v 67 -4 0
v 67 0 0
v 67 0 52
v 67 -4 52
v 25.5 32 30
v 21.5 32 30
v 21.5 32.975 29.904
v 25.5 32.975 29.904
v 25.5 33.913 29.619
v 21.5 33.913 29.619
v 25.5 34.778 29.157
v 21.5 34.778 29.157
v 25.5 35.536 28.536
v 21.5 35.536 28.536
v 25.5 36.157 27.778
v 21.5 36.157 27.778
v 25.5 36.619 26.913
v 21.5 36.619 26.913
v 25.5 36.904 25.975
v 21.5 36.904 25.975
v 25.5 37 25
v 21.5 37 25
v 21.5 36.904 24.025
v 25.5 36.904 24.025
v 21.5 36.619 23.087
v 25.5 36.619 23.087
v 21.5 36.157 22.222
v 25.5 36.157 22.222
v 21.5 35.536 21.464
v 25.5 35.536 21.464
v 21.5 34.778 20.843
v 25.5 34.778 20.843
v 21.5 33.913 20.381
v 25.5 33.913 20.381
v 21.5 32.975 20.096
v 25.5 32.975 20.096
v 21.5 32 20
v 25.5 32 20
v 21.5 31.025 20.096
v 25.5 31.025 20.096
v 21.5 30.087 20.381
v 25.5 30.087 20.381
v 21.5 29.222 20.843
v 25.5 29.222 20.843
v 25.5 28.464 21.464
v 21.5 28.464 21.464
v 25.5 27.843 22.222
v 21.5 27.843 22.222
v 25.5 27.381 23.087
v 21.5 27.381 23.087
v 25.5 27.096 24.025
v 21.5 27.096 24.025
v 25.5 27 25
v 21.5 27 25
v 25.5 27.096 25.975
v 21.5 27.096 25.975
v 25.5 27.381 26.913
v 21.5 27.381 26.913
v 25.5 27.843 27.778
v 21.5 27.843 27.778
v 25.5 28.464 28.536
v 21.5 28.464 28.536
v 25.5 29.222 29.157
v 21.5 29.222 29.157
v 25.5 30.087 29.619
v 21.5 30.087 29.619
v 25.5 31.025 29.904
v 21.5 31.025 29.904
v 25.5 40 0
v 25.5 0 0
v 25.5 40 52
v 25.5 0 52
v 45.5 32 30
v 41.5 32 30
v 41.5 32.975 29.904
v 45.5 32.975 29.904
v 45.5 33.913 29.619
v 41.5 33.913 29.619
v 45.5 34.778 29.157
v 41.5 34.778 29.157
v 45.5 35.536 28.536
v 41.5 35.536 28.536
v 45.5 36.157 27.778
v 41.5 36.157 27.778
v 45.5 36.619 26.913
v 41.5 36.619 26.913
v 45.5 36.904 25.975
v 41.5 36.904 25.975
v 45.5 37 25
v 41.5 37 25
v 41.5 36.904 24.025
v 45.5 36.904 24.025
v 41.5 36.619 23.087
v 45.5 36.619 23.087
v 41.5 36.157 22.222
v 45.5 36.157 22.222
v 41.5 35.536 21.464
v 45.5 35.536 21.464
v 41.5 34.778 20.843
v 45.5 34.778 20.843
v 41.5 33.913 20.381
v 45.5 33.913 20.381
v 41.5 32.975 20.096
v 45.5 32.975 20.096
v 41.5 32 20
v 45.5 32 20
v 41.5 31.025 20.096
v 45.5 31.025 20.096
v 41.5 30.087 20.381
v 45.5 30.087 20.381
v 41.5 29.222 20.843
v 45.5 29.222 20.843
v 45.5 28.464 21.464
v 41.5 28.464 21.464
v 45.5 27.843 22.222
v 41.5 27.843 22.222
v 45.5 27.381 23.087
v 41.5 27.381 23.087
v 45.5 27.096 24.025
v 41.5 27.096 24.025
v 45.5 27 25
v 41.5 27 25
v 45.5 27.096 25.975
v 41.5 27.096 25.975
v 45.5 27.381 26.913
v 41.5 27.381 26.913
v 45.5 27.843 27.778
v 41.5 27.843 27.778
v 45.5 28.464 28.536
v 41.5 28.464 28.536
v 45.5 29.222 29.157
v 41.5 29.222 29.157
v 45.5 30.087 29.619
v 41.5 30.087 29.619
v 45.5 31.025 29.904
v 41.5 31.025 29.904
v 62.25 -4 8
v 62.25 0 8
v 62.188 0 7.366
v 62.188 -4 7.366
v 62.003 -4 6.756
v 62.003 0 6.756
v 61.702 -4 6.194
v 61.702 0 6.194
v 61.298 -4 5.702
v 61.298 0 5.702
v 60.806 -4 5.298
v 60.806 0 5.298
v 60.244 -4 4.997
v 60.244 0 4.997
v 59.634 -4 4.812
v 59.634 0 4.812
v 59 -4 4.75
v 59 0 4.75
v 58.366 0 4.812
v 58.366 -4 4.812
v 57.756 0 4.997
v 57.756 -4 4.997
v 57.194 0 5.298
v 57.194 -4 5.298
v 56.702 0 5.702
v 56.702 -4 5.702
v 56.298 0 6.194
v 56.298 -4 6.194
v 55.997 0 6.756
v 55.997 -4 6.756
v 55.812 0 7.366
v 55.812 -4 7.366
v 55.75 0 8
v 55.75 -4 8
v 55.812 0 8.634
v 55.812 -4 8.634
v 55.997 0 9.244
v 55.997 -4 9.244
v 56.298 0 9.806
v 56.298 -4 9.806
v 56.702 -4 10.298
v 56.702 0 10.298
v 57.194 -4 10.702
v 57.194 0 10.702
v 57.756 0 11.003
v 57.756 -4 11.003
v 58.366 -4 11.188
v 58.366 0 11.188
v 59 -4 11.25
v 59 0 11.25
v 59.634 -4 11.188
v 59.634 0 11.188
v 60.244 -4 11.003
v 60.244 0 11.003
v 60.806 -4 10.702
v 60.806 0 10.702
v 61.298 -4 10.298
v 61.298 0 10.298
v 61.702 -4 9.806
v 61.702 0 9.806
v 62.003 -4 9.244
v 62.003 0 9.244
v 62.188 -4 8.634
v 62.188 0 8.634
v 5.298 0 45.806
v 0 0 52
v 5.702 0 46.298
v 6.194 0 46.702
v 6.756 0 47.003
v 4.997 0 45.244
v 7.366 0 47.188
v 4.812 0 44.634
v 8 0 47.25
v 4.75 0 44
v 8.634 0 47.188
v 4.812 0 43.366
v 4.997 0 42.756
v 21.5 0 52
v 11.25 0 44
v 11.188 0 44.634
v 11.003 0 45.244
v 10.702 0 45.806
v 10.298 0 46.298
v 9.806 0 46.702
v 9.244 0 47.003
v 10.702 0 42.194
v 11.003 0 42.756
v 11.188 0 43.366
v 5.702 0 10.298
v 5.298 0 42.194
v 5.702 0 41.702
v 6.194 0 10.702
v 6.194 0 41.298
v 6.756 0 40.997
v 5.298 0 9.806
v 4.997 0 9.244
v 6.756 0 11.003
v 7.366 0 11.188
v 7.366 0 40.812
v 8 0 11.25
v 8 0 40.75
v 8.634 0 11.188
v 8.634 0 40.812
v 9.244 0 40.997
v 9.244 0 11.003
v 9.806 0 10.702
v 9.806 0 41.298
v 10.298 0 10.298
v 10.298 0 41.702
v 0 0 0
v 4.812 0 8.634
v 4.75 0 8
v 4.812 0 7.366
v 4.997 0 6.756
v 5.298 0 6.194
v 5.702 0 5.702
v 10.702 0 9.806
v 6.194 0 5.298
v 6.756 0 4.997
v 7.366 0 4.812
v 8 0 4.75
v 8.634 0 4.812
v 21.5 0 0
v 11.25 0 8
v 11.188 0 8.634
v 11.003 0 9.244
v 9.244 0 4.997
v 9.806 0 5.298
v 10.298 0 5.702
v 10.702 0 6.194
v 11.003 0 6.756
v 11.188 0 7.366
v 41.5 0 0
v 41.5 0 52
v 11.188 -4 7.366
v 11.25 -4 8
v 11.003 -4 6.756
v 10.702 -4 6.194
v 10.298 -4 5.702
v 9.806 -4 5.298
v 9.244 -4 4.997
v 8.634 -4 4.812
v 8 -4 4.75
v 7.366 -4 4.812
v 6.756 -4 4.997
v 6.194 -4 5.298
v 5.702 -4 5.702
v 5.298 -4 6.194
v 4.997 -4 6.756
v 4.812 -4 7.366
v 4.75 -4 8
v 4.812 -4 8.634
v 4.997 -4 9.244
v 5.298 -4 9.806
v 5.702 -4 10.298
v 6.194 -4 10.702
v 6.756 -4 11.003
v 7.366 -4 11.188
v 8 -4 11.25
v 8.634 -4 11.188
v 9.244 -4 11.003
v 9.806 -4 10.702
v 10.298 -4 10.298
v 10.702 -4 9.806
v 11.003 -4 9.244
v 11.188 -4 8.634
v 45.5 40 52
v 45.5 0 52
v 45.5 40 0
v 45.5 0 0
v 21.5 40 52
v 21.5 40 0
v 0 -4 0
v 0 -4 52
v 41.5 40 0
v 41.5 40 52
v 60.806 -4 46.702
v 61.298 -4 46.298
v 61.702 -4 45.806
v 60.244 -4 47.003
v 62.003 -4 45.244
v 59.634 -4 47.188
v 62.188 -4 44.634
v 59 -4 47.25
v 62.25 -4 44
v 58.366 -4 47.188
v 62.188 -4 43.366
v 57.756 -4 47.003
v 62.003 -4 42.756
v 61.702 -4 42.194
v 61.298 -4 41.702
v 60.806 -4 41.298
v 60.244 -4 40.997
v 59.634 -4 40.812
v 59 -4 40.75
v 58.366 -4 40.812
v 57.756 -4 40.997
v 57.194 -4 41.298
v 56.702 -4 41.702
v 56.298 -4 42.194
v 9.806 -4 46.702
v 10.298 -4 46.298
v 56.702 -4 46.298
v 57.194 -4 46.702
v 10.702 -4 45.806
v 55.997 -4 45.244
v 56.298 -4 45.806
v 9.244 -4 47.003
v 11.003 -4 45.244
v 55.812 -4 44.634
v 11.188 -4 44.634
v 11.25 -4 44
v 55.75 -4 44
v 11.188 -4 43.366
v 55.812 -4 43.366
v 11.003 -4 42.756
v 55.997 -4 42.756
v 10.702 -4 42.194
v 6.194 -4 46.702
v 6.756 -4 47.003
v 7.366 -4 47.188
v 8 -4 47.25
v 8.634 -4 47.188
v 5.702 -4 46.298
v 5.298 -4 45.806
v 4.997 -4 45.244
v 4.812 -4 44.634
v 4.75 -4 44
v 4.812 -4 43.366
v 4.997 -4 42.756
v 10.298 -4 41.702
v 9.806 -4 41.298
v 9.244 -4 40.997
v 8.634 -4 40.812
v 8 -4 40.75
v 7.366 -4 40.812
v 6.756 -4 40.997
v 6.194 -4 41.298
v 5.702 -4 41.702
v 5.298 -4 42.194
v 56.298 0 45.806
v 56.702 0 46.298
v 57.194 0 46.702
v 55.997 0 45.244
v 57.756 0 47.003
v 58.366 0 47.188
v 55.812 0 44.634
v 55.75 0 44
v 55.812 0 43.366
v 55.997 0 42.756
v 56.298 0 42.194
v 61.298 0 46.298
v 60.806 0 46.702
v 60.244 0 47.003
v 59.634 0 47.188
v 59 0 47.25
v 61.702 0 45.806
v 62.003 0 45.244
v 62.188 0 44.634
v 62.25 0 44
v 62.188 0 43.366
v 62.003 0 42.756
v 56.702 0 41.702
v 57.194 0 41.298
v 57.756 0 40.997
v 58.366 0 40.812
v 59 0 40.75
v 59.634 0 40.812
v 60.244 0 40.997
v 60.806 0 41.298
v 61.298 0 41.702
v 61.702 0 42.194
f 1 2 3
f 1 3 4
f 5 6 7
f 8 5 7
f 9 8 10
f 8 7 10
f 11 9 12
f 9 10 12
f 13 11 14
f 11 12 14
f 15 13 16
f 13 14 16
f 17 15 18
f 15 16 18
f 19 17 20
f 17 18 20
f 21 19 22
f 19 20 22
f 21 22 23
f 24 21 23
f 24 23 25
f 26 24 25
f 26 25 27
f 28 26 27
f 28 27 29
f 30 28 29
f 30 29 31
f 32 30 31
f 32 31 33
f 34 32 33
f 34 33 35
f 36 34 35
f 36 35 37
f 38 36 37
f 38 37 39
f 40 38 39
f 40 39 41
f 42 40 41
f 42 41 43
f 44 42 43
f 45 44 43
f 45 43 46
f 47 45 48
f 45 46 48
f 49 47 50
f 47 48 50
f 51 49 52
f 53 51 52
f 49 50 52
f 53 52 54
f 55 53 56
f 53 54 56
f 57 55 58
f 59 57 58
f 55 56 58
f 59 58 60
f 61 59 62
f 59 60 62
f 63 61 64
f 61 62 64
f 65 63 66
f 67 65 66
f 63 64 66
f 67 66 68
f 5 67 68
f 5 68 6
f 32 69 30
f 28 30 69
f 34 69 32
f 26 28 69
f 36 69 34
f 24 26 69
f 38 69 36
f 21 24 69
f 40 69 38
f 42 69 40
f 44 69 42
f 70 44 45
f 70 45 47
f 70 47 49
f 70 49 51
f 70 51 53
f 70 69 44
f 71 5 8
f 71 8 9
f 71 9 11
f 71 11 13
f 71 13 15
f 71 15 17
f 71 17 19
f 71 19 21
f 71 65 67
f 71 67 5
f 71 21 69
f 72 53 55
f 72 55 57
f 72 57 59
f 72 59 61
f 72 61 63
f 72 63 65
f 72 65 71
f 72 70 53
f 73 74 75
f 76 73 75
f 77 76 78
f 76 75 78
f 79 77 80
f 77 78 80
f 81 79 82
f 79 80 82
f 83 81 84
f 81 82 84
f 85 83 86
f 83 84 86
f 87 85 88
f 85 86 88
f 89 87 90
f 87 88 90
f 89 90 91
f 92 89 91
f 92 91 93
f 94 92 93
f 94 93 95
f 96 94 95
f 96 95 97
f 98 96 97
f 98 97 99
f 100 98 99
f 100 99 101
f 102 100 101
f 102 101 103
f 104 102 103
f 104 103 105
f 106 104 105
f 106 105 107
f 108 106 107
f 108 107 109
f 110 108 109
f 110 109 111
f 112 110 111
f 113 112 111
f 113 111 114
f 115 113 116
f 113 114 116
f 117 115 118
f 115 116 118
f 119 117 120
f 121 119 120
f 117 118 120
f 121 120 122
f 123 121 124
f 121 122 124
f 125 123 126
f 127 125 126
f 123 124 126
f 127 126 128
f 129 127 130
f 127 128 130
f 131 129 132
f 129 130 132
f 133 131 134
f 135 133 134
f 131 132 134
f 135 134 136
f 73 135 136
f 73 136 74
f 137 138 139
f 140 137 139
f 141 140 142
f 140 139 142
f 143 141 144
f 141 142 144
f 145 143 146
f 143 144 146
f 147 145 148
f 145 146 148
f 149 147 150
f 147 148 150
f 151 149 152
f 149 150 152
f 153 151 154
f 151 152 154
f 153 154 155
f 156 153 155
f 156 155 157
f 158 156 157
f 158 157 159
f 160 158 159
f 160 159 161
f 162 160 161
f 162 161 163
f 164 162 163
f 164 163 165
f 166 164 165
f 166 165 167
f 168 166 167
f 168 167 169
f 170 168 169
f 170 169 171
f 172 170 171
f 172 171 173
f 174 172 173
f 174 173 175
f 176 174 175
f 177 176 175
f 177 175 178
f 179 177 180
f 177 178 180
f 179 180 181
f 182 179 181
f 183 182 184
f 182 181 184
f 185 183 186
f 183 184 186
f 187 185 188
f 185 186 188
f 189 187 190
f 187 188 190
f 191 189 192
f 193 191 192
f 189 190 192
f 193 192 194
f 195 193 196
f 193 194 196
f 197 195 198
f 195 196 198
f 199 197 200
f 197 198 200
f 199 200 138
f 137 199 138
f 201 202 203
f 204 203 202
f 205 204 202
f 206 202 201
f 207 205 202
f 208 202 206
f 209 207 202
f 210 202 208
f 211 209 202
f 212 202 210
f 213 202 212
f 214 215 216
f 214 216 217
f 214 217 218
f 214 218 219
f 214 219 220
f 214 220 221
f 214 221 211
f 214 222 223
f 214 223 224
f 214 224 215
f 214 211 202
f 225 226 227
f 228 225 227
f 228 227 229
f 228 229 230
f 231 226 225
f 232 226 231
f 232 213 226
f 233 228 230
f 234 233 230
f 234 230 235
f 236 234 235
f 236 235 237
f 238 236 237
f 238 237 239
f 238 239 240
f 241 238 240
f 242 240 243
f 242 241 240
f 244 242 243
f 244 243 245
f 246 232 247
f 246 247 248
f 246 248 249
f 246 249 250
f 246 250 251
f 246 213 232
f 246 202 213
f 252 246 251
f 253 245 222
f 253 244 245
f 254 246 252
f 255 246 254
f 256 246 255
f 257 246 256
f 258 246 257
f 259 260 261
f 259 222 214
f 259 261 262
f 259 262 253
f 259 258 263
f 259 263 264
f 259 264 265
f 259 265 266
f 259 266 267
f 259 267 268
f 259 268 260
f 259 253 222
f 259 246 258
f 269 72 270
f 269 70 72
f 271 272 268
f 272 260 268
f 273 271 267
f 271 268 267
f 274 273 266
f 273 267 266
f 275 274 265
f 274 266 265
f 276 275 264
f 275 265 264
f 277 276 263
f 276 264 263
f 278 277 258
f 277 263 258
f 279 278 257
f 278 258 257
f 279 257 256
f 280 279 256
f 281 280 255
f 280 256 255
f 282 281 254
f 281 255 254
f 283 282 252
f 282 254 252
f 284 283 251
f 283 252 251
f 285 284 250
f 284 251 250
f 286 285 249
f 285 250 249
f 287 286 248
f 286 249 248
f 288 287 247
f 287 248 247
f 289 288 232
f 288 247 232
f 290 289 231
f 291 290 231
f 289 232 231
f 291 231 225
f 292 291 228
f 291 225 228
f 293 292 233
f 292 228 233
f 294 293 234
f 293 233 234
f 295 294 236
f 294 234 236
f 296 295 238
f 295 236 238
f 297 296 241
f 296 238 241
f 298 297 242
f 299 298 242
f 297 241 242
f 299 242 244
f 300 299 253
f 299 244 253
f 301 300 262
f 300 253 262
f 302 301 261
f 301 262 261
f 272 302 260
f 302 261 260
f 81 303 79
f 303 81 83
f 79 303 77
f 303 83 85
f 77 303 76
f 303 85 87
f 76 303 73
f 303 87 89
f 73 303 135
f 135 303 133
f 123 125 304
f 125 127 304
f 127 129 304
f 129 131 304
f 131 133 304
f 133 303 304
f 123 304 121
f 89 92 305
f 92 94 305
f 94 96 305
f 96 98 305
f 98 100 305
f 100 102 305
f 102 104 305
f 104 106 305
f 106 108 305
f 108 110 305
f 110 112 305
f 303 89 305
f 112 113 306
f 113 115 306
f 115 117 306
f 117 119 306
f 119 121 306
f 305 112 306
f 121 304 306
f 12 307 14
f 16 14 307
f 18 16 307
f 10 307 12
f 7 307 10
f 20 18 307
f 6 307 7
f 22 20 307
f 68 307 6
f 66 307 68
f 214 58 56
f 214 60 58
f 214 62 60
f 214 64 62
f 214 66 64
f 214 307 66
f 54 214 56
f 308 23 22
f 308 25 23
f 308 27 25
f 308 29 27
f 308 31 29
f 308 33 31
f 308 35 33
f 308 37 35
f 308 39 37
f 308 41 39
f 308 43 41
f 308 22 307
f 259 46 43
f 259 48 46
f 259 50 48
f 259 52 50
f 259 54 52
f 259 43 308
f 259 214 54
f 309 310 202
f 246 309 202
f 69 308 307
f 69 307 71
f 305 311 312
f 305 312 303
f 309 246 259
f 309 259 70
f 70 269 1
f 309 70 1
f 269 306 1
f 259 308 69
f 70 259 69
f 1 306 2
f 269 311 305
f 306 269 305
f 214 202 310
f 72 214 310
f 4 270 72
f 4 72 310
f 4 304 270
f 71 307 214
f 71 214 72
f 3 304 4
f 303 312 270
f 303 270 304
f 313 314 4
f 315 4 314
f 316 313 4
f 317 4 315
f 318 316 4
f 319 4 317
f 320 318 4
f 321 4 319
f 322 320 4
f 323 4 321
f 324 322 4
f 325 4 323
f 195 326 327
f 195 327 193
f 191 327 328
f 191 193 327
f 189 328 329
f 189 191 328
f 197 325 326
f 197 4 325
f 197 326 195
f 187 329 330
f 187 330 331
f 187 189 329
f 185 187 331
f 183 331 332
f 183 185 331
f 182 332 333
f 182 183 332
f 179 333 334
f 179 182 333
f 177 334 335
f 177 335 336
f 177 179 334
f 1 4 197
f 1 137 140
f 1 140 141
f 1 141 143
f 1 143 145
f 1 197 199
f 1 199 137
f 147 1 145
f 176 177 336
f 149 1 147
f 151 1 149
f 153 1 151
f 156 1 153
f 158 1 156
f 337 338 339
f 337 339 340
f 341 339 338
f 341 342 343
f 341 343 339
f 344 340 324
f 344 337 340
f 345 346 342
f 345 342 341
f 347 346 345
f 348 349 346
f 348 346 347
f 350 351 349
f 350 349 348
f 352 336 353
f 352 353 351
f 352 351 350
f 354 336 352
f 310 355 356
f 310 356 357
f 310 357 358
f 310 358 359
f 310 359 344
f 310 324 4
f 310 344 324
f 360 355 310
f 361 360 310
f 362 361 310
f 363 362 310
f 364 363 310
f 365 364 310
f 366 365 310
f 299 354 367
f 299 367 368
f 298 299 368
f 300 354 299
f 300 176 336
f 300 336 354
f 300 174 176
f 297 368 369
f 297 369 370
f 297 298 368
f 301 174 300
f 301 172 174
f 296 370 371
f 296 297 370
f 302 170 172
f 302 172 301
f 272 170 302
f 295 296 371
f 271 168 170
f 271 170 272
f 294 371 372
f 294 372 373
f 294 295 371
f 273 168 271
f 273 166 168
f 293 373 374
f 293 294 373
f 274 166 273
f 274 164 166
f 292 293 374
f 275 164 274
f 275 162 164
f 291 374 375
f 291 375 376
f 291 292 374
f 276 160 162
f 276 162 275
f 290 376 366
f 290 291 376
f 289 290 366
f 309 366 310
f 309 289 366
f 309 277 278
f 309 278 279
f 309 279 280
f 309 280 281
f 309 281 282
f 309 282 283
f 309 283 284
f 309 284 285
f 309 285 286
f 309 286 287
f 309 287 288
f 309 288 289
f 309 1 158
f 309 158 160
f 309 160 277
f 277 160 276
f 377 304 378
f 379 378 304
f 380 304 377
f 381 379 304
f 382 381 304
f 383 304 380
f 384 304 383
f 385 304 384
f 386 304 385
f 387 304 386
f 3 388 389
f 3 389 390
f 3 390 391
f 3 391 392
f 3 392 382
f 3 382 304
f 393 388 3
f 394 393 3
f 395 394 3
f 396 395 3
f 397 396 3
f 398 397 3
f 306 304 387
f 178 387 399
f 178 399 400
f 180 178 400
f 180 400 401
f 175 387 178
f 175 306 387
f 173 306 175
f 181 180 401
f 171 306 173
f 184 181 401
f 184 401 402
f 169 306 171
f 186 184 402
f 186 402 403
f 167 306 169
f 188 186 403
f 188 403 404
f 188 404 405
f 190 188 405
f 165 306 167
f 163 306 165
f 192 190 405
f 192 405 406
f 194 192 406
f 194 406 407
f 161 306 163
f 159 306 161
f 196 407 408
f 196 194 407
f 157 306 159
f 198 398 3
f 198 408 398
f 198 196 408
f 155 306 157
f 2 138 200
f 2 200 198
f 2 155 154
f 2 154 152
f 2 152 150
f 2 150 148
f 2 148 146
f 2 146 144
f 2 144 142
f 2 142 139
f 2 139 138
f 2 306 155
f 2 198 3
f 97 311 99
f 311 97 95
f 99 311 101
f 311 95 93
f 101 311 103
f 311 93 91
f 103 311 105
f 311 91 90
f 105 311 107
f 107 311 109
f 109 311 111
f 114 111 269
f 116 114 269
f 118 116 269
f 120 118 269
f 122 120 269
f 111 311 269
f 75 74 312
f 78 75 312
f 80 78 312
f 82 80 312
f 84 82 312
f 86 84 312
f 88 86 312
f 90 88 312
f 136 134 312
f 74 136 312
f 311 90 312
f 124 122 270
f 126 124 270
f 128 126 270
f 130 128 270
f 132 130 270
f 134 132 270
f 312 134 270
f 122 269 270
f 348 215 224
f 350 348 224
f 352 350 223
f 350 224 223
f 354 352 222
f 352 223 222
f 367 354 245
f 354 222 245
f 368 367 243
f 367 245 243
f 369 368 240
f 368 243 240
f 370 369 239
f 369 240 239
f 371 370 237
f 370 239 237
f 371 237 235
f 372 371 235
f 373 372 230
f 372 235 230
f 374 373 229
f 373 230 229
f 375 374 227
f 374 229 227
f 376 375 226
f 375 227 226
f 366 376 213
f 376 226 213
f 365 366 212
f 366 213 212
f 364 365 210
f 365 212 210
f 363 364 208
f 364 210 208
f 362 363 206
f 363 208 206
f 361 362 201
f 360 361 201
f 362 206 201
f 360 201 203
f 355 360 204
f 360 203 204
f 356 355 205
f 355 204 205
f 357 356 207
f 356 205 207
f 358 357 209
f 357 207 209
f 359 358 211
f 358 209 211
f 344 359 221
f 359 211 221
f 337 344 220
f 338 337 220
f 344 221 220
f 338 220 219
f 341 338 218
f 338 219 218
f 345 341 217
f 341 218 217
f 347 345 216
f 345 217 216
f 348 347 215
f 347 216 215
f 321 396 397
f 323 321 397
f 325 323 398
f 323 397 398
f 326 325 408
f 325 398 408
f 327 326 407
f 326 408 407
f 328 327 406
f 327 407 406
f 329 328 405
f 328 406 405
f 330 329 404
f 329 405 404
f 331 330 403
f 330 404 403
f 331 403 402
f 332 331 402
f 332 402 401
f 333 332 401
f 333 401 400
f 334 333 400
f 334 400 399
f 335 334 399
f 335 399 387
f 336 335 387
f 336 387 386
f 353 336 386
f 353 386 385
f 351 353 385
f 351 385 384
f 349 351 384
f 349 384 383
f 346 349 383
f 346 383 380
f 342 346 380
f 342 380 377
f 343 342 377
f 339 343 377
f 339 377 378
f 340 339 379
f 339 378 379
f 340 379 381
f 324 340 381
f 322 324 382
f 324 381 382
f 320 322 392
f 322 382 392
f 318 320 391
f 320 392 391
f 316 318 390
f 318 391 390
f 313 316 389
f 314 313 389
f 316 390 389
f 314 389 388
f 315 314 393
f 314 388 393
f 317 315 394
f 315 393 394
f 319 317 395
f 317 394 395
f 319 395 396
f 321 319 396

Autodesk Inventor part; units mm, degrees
ref_plane "YZ Plane" through (0, 0, 0) normal (1, 0, 0) x (0, 1, 0)
ref_plane "XZ Plane" through (0, 0, 0) normal (0, 1, 0) x (-1, 0, 0)
ref_plane "XY Plane" through (0, 0, 0) normal (0, 0, 1) x (1, 0, 0)
sketch "Sketch1" plane through (0, 0, 0) normal (0, 0, 1) x (1, 0, 0)
  line L0 (0, 0) -> (67, 0)
  line L1 (67, 0) -> (67, -4)
  line L2 (67, -4) -> (0, -4)
  line L3 (0, -4) -> (0, 0)
  dimension "d0" = 67
  dimension "d1" = 4
extrude "Extrusion1" add sketch "Sketch1" along normal blind 52
sketch "Sketch2" plane through (0, 0, 0) normal (0, 1, 0) x (1, 0, 0)
  line L0 (8, -44) -> (59, -44)
  line L1 (59, -44) -> (59, -8)
  line L2 (59, -8) -> (8, -8)
  line L3 (8, -8) -> (8, -44)
  line L4 (8, -44) -> (59, -8) construction
  line L5 (59, -44) -> (8, -8) construction
  line L6 (0, 0) -> (0, -52) projected
  line L7 (0, 0) -> (67, 0) projected
  circle A0 centre (8, -8) radius 3.25
  circle A1 centre (59, -8) radius 3.25
  circle A2 centre (8, -44) radius 3.25
  circle A3 centre (59, -44) radius 3.25
  point P0 (33.5, -26)
  dimension "d4" = 51
  dimension "d5" = 36
  dimension "d6" = 8
  dimension "d7" = 8
  dimension "d8" = 6.5
  dimension "d9" = 6.5
  dimension "d10" = 6.5
  dimension "d11" = 6.5
extrude "Extrusion2" cut sketch "Sketch2" against normal blind 4 contours L3 A2 L0 | L0 A2 L3 | A3 L1 L0 | L0 L1 A3 | A0 L2 L3 | L3 L2 A0 | A1 L2 L1 | L1 L2 A1
sketch "Sketch3" plane through (0, 0, 0) normal (0, 1, 0) x (1, 0, 0)
  line L0 (0, -52) -> (67, -52) projected
  line L1 (21.5, 0) -> (25.5, 0)
  line L2 (25.5, 0) -> (25.5, -52)
  line L3 (25.5, -52) -> (21.5, -52)
  line L4 (21.5, -52) -> (21.5, 0)
  line L5 (0, 0) -> (0, -52) projected
  line L6 (45.5, 0) -> (41.5, 0)
  line L7 (41.5, 0) -> (41.5, -52)
  line L8 (41.5, -52) -> (45.5, -52)
  line L9 (45.5, -52) -> (45.5, 0)
  line L10 (67, 0) -> (67, -52) projected
  dimension "d14" = 4
  dimension "d15" = 21.5
  dimension "d16" = 4
  dimension "d17" = 21.5
  dimension "d18" = 52
  dimension "d19" = 52
extrude "Extrusion3" add sketch "Sketch3" along normal blind 40
sketch "Sketch4" plane through (21.5, 0, 0) normal (-1, 0, 0) x (0, 0, 1)
  circle A0 centre (25, 32) radius 5
  line L0 (0, -4) -> (52, -4) projected
  line L1 (52, 0) -> (52, 40) projected
  point P0 (0, 0)
  dimension "d22" = 10
  dimension "d23" = 36
  dimension "d24" = 27
extrude "Extrusion4" cut sketch "Sketch4" against normal blind 40
properties part number "SDB 32" material "Stainless Steel"
